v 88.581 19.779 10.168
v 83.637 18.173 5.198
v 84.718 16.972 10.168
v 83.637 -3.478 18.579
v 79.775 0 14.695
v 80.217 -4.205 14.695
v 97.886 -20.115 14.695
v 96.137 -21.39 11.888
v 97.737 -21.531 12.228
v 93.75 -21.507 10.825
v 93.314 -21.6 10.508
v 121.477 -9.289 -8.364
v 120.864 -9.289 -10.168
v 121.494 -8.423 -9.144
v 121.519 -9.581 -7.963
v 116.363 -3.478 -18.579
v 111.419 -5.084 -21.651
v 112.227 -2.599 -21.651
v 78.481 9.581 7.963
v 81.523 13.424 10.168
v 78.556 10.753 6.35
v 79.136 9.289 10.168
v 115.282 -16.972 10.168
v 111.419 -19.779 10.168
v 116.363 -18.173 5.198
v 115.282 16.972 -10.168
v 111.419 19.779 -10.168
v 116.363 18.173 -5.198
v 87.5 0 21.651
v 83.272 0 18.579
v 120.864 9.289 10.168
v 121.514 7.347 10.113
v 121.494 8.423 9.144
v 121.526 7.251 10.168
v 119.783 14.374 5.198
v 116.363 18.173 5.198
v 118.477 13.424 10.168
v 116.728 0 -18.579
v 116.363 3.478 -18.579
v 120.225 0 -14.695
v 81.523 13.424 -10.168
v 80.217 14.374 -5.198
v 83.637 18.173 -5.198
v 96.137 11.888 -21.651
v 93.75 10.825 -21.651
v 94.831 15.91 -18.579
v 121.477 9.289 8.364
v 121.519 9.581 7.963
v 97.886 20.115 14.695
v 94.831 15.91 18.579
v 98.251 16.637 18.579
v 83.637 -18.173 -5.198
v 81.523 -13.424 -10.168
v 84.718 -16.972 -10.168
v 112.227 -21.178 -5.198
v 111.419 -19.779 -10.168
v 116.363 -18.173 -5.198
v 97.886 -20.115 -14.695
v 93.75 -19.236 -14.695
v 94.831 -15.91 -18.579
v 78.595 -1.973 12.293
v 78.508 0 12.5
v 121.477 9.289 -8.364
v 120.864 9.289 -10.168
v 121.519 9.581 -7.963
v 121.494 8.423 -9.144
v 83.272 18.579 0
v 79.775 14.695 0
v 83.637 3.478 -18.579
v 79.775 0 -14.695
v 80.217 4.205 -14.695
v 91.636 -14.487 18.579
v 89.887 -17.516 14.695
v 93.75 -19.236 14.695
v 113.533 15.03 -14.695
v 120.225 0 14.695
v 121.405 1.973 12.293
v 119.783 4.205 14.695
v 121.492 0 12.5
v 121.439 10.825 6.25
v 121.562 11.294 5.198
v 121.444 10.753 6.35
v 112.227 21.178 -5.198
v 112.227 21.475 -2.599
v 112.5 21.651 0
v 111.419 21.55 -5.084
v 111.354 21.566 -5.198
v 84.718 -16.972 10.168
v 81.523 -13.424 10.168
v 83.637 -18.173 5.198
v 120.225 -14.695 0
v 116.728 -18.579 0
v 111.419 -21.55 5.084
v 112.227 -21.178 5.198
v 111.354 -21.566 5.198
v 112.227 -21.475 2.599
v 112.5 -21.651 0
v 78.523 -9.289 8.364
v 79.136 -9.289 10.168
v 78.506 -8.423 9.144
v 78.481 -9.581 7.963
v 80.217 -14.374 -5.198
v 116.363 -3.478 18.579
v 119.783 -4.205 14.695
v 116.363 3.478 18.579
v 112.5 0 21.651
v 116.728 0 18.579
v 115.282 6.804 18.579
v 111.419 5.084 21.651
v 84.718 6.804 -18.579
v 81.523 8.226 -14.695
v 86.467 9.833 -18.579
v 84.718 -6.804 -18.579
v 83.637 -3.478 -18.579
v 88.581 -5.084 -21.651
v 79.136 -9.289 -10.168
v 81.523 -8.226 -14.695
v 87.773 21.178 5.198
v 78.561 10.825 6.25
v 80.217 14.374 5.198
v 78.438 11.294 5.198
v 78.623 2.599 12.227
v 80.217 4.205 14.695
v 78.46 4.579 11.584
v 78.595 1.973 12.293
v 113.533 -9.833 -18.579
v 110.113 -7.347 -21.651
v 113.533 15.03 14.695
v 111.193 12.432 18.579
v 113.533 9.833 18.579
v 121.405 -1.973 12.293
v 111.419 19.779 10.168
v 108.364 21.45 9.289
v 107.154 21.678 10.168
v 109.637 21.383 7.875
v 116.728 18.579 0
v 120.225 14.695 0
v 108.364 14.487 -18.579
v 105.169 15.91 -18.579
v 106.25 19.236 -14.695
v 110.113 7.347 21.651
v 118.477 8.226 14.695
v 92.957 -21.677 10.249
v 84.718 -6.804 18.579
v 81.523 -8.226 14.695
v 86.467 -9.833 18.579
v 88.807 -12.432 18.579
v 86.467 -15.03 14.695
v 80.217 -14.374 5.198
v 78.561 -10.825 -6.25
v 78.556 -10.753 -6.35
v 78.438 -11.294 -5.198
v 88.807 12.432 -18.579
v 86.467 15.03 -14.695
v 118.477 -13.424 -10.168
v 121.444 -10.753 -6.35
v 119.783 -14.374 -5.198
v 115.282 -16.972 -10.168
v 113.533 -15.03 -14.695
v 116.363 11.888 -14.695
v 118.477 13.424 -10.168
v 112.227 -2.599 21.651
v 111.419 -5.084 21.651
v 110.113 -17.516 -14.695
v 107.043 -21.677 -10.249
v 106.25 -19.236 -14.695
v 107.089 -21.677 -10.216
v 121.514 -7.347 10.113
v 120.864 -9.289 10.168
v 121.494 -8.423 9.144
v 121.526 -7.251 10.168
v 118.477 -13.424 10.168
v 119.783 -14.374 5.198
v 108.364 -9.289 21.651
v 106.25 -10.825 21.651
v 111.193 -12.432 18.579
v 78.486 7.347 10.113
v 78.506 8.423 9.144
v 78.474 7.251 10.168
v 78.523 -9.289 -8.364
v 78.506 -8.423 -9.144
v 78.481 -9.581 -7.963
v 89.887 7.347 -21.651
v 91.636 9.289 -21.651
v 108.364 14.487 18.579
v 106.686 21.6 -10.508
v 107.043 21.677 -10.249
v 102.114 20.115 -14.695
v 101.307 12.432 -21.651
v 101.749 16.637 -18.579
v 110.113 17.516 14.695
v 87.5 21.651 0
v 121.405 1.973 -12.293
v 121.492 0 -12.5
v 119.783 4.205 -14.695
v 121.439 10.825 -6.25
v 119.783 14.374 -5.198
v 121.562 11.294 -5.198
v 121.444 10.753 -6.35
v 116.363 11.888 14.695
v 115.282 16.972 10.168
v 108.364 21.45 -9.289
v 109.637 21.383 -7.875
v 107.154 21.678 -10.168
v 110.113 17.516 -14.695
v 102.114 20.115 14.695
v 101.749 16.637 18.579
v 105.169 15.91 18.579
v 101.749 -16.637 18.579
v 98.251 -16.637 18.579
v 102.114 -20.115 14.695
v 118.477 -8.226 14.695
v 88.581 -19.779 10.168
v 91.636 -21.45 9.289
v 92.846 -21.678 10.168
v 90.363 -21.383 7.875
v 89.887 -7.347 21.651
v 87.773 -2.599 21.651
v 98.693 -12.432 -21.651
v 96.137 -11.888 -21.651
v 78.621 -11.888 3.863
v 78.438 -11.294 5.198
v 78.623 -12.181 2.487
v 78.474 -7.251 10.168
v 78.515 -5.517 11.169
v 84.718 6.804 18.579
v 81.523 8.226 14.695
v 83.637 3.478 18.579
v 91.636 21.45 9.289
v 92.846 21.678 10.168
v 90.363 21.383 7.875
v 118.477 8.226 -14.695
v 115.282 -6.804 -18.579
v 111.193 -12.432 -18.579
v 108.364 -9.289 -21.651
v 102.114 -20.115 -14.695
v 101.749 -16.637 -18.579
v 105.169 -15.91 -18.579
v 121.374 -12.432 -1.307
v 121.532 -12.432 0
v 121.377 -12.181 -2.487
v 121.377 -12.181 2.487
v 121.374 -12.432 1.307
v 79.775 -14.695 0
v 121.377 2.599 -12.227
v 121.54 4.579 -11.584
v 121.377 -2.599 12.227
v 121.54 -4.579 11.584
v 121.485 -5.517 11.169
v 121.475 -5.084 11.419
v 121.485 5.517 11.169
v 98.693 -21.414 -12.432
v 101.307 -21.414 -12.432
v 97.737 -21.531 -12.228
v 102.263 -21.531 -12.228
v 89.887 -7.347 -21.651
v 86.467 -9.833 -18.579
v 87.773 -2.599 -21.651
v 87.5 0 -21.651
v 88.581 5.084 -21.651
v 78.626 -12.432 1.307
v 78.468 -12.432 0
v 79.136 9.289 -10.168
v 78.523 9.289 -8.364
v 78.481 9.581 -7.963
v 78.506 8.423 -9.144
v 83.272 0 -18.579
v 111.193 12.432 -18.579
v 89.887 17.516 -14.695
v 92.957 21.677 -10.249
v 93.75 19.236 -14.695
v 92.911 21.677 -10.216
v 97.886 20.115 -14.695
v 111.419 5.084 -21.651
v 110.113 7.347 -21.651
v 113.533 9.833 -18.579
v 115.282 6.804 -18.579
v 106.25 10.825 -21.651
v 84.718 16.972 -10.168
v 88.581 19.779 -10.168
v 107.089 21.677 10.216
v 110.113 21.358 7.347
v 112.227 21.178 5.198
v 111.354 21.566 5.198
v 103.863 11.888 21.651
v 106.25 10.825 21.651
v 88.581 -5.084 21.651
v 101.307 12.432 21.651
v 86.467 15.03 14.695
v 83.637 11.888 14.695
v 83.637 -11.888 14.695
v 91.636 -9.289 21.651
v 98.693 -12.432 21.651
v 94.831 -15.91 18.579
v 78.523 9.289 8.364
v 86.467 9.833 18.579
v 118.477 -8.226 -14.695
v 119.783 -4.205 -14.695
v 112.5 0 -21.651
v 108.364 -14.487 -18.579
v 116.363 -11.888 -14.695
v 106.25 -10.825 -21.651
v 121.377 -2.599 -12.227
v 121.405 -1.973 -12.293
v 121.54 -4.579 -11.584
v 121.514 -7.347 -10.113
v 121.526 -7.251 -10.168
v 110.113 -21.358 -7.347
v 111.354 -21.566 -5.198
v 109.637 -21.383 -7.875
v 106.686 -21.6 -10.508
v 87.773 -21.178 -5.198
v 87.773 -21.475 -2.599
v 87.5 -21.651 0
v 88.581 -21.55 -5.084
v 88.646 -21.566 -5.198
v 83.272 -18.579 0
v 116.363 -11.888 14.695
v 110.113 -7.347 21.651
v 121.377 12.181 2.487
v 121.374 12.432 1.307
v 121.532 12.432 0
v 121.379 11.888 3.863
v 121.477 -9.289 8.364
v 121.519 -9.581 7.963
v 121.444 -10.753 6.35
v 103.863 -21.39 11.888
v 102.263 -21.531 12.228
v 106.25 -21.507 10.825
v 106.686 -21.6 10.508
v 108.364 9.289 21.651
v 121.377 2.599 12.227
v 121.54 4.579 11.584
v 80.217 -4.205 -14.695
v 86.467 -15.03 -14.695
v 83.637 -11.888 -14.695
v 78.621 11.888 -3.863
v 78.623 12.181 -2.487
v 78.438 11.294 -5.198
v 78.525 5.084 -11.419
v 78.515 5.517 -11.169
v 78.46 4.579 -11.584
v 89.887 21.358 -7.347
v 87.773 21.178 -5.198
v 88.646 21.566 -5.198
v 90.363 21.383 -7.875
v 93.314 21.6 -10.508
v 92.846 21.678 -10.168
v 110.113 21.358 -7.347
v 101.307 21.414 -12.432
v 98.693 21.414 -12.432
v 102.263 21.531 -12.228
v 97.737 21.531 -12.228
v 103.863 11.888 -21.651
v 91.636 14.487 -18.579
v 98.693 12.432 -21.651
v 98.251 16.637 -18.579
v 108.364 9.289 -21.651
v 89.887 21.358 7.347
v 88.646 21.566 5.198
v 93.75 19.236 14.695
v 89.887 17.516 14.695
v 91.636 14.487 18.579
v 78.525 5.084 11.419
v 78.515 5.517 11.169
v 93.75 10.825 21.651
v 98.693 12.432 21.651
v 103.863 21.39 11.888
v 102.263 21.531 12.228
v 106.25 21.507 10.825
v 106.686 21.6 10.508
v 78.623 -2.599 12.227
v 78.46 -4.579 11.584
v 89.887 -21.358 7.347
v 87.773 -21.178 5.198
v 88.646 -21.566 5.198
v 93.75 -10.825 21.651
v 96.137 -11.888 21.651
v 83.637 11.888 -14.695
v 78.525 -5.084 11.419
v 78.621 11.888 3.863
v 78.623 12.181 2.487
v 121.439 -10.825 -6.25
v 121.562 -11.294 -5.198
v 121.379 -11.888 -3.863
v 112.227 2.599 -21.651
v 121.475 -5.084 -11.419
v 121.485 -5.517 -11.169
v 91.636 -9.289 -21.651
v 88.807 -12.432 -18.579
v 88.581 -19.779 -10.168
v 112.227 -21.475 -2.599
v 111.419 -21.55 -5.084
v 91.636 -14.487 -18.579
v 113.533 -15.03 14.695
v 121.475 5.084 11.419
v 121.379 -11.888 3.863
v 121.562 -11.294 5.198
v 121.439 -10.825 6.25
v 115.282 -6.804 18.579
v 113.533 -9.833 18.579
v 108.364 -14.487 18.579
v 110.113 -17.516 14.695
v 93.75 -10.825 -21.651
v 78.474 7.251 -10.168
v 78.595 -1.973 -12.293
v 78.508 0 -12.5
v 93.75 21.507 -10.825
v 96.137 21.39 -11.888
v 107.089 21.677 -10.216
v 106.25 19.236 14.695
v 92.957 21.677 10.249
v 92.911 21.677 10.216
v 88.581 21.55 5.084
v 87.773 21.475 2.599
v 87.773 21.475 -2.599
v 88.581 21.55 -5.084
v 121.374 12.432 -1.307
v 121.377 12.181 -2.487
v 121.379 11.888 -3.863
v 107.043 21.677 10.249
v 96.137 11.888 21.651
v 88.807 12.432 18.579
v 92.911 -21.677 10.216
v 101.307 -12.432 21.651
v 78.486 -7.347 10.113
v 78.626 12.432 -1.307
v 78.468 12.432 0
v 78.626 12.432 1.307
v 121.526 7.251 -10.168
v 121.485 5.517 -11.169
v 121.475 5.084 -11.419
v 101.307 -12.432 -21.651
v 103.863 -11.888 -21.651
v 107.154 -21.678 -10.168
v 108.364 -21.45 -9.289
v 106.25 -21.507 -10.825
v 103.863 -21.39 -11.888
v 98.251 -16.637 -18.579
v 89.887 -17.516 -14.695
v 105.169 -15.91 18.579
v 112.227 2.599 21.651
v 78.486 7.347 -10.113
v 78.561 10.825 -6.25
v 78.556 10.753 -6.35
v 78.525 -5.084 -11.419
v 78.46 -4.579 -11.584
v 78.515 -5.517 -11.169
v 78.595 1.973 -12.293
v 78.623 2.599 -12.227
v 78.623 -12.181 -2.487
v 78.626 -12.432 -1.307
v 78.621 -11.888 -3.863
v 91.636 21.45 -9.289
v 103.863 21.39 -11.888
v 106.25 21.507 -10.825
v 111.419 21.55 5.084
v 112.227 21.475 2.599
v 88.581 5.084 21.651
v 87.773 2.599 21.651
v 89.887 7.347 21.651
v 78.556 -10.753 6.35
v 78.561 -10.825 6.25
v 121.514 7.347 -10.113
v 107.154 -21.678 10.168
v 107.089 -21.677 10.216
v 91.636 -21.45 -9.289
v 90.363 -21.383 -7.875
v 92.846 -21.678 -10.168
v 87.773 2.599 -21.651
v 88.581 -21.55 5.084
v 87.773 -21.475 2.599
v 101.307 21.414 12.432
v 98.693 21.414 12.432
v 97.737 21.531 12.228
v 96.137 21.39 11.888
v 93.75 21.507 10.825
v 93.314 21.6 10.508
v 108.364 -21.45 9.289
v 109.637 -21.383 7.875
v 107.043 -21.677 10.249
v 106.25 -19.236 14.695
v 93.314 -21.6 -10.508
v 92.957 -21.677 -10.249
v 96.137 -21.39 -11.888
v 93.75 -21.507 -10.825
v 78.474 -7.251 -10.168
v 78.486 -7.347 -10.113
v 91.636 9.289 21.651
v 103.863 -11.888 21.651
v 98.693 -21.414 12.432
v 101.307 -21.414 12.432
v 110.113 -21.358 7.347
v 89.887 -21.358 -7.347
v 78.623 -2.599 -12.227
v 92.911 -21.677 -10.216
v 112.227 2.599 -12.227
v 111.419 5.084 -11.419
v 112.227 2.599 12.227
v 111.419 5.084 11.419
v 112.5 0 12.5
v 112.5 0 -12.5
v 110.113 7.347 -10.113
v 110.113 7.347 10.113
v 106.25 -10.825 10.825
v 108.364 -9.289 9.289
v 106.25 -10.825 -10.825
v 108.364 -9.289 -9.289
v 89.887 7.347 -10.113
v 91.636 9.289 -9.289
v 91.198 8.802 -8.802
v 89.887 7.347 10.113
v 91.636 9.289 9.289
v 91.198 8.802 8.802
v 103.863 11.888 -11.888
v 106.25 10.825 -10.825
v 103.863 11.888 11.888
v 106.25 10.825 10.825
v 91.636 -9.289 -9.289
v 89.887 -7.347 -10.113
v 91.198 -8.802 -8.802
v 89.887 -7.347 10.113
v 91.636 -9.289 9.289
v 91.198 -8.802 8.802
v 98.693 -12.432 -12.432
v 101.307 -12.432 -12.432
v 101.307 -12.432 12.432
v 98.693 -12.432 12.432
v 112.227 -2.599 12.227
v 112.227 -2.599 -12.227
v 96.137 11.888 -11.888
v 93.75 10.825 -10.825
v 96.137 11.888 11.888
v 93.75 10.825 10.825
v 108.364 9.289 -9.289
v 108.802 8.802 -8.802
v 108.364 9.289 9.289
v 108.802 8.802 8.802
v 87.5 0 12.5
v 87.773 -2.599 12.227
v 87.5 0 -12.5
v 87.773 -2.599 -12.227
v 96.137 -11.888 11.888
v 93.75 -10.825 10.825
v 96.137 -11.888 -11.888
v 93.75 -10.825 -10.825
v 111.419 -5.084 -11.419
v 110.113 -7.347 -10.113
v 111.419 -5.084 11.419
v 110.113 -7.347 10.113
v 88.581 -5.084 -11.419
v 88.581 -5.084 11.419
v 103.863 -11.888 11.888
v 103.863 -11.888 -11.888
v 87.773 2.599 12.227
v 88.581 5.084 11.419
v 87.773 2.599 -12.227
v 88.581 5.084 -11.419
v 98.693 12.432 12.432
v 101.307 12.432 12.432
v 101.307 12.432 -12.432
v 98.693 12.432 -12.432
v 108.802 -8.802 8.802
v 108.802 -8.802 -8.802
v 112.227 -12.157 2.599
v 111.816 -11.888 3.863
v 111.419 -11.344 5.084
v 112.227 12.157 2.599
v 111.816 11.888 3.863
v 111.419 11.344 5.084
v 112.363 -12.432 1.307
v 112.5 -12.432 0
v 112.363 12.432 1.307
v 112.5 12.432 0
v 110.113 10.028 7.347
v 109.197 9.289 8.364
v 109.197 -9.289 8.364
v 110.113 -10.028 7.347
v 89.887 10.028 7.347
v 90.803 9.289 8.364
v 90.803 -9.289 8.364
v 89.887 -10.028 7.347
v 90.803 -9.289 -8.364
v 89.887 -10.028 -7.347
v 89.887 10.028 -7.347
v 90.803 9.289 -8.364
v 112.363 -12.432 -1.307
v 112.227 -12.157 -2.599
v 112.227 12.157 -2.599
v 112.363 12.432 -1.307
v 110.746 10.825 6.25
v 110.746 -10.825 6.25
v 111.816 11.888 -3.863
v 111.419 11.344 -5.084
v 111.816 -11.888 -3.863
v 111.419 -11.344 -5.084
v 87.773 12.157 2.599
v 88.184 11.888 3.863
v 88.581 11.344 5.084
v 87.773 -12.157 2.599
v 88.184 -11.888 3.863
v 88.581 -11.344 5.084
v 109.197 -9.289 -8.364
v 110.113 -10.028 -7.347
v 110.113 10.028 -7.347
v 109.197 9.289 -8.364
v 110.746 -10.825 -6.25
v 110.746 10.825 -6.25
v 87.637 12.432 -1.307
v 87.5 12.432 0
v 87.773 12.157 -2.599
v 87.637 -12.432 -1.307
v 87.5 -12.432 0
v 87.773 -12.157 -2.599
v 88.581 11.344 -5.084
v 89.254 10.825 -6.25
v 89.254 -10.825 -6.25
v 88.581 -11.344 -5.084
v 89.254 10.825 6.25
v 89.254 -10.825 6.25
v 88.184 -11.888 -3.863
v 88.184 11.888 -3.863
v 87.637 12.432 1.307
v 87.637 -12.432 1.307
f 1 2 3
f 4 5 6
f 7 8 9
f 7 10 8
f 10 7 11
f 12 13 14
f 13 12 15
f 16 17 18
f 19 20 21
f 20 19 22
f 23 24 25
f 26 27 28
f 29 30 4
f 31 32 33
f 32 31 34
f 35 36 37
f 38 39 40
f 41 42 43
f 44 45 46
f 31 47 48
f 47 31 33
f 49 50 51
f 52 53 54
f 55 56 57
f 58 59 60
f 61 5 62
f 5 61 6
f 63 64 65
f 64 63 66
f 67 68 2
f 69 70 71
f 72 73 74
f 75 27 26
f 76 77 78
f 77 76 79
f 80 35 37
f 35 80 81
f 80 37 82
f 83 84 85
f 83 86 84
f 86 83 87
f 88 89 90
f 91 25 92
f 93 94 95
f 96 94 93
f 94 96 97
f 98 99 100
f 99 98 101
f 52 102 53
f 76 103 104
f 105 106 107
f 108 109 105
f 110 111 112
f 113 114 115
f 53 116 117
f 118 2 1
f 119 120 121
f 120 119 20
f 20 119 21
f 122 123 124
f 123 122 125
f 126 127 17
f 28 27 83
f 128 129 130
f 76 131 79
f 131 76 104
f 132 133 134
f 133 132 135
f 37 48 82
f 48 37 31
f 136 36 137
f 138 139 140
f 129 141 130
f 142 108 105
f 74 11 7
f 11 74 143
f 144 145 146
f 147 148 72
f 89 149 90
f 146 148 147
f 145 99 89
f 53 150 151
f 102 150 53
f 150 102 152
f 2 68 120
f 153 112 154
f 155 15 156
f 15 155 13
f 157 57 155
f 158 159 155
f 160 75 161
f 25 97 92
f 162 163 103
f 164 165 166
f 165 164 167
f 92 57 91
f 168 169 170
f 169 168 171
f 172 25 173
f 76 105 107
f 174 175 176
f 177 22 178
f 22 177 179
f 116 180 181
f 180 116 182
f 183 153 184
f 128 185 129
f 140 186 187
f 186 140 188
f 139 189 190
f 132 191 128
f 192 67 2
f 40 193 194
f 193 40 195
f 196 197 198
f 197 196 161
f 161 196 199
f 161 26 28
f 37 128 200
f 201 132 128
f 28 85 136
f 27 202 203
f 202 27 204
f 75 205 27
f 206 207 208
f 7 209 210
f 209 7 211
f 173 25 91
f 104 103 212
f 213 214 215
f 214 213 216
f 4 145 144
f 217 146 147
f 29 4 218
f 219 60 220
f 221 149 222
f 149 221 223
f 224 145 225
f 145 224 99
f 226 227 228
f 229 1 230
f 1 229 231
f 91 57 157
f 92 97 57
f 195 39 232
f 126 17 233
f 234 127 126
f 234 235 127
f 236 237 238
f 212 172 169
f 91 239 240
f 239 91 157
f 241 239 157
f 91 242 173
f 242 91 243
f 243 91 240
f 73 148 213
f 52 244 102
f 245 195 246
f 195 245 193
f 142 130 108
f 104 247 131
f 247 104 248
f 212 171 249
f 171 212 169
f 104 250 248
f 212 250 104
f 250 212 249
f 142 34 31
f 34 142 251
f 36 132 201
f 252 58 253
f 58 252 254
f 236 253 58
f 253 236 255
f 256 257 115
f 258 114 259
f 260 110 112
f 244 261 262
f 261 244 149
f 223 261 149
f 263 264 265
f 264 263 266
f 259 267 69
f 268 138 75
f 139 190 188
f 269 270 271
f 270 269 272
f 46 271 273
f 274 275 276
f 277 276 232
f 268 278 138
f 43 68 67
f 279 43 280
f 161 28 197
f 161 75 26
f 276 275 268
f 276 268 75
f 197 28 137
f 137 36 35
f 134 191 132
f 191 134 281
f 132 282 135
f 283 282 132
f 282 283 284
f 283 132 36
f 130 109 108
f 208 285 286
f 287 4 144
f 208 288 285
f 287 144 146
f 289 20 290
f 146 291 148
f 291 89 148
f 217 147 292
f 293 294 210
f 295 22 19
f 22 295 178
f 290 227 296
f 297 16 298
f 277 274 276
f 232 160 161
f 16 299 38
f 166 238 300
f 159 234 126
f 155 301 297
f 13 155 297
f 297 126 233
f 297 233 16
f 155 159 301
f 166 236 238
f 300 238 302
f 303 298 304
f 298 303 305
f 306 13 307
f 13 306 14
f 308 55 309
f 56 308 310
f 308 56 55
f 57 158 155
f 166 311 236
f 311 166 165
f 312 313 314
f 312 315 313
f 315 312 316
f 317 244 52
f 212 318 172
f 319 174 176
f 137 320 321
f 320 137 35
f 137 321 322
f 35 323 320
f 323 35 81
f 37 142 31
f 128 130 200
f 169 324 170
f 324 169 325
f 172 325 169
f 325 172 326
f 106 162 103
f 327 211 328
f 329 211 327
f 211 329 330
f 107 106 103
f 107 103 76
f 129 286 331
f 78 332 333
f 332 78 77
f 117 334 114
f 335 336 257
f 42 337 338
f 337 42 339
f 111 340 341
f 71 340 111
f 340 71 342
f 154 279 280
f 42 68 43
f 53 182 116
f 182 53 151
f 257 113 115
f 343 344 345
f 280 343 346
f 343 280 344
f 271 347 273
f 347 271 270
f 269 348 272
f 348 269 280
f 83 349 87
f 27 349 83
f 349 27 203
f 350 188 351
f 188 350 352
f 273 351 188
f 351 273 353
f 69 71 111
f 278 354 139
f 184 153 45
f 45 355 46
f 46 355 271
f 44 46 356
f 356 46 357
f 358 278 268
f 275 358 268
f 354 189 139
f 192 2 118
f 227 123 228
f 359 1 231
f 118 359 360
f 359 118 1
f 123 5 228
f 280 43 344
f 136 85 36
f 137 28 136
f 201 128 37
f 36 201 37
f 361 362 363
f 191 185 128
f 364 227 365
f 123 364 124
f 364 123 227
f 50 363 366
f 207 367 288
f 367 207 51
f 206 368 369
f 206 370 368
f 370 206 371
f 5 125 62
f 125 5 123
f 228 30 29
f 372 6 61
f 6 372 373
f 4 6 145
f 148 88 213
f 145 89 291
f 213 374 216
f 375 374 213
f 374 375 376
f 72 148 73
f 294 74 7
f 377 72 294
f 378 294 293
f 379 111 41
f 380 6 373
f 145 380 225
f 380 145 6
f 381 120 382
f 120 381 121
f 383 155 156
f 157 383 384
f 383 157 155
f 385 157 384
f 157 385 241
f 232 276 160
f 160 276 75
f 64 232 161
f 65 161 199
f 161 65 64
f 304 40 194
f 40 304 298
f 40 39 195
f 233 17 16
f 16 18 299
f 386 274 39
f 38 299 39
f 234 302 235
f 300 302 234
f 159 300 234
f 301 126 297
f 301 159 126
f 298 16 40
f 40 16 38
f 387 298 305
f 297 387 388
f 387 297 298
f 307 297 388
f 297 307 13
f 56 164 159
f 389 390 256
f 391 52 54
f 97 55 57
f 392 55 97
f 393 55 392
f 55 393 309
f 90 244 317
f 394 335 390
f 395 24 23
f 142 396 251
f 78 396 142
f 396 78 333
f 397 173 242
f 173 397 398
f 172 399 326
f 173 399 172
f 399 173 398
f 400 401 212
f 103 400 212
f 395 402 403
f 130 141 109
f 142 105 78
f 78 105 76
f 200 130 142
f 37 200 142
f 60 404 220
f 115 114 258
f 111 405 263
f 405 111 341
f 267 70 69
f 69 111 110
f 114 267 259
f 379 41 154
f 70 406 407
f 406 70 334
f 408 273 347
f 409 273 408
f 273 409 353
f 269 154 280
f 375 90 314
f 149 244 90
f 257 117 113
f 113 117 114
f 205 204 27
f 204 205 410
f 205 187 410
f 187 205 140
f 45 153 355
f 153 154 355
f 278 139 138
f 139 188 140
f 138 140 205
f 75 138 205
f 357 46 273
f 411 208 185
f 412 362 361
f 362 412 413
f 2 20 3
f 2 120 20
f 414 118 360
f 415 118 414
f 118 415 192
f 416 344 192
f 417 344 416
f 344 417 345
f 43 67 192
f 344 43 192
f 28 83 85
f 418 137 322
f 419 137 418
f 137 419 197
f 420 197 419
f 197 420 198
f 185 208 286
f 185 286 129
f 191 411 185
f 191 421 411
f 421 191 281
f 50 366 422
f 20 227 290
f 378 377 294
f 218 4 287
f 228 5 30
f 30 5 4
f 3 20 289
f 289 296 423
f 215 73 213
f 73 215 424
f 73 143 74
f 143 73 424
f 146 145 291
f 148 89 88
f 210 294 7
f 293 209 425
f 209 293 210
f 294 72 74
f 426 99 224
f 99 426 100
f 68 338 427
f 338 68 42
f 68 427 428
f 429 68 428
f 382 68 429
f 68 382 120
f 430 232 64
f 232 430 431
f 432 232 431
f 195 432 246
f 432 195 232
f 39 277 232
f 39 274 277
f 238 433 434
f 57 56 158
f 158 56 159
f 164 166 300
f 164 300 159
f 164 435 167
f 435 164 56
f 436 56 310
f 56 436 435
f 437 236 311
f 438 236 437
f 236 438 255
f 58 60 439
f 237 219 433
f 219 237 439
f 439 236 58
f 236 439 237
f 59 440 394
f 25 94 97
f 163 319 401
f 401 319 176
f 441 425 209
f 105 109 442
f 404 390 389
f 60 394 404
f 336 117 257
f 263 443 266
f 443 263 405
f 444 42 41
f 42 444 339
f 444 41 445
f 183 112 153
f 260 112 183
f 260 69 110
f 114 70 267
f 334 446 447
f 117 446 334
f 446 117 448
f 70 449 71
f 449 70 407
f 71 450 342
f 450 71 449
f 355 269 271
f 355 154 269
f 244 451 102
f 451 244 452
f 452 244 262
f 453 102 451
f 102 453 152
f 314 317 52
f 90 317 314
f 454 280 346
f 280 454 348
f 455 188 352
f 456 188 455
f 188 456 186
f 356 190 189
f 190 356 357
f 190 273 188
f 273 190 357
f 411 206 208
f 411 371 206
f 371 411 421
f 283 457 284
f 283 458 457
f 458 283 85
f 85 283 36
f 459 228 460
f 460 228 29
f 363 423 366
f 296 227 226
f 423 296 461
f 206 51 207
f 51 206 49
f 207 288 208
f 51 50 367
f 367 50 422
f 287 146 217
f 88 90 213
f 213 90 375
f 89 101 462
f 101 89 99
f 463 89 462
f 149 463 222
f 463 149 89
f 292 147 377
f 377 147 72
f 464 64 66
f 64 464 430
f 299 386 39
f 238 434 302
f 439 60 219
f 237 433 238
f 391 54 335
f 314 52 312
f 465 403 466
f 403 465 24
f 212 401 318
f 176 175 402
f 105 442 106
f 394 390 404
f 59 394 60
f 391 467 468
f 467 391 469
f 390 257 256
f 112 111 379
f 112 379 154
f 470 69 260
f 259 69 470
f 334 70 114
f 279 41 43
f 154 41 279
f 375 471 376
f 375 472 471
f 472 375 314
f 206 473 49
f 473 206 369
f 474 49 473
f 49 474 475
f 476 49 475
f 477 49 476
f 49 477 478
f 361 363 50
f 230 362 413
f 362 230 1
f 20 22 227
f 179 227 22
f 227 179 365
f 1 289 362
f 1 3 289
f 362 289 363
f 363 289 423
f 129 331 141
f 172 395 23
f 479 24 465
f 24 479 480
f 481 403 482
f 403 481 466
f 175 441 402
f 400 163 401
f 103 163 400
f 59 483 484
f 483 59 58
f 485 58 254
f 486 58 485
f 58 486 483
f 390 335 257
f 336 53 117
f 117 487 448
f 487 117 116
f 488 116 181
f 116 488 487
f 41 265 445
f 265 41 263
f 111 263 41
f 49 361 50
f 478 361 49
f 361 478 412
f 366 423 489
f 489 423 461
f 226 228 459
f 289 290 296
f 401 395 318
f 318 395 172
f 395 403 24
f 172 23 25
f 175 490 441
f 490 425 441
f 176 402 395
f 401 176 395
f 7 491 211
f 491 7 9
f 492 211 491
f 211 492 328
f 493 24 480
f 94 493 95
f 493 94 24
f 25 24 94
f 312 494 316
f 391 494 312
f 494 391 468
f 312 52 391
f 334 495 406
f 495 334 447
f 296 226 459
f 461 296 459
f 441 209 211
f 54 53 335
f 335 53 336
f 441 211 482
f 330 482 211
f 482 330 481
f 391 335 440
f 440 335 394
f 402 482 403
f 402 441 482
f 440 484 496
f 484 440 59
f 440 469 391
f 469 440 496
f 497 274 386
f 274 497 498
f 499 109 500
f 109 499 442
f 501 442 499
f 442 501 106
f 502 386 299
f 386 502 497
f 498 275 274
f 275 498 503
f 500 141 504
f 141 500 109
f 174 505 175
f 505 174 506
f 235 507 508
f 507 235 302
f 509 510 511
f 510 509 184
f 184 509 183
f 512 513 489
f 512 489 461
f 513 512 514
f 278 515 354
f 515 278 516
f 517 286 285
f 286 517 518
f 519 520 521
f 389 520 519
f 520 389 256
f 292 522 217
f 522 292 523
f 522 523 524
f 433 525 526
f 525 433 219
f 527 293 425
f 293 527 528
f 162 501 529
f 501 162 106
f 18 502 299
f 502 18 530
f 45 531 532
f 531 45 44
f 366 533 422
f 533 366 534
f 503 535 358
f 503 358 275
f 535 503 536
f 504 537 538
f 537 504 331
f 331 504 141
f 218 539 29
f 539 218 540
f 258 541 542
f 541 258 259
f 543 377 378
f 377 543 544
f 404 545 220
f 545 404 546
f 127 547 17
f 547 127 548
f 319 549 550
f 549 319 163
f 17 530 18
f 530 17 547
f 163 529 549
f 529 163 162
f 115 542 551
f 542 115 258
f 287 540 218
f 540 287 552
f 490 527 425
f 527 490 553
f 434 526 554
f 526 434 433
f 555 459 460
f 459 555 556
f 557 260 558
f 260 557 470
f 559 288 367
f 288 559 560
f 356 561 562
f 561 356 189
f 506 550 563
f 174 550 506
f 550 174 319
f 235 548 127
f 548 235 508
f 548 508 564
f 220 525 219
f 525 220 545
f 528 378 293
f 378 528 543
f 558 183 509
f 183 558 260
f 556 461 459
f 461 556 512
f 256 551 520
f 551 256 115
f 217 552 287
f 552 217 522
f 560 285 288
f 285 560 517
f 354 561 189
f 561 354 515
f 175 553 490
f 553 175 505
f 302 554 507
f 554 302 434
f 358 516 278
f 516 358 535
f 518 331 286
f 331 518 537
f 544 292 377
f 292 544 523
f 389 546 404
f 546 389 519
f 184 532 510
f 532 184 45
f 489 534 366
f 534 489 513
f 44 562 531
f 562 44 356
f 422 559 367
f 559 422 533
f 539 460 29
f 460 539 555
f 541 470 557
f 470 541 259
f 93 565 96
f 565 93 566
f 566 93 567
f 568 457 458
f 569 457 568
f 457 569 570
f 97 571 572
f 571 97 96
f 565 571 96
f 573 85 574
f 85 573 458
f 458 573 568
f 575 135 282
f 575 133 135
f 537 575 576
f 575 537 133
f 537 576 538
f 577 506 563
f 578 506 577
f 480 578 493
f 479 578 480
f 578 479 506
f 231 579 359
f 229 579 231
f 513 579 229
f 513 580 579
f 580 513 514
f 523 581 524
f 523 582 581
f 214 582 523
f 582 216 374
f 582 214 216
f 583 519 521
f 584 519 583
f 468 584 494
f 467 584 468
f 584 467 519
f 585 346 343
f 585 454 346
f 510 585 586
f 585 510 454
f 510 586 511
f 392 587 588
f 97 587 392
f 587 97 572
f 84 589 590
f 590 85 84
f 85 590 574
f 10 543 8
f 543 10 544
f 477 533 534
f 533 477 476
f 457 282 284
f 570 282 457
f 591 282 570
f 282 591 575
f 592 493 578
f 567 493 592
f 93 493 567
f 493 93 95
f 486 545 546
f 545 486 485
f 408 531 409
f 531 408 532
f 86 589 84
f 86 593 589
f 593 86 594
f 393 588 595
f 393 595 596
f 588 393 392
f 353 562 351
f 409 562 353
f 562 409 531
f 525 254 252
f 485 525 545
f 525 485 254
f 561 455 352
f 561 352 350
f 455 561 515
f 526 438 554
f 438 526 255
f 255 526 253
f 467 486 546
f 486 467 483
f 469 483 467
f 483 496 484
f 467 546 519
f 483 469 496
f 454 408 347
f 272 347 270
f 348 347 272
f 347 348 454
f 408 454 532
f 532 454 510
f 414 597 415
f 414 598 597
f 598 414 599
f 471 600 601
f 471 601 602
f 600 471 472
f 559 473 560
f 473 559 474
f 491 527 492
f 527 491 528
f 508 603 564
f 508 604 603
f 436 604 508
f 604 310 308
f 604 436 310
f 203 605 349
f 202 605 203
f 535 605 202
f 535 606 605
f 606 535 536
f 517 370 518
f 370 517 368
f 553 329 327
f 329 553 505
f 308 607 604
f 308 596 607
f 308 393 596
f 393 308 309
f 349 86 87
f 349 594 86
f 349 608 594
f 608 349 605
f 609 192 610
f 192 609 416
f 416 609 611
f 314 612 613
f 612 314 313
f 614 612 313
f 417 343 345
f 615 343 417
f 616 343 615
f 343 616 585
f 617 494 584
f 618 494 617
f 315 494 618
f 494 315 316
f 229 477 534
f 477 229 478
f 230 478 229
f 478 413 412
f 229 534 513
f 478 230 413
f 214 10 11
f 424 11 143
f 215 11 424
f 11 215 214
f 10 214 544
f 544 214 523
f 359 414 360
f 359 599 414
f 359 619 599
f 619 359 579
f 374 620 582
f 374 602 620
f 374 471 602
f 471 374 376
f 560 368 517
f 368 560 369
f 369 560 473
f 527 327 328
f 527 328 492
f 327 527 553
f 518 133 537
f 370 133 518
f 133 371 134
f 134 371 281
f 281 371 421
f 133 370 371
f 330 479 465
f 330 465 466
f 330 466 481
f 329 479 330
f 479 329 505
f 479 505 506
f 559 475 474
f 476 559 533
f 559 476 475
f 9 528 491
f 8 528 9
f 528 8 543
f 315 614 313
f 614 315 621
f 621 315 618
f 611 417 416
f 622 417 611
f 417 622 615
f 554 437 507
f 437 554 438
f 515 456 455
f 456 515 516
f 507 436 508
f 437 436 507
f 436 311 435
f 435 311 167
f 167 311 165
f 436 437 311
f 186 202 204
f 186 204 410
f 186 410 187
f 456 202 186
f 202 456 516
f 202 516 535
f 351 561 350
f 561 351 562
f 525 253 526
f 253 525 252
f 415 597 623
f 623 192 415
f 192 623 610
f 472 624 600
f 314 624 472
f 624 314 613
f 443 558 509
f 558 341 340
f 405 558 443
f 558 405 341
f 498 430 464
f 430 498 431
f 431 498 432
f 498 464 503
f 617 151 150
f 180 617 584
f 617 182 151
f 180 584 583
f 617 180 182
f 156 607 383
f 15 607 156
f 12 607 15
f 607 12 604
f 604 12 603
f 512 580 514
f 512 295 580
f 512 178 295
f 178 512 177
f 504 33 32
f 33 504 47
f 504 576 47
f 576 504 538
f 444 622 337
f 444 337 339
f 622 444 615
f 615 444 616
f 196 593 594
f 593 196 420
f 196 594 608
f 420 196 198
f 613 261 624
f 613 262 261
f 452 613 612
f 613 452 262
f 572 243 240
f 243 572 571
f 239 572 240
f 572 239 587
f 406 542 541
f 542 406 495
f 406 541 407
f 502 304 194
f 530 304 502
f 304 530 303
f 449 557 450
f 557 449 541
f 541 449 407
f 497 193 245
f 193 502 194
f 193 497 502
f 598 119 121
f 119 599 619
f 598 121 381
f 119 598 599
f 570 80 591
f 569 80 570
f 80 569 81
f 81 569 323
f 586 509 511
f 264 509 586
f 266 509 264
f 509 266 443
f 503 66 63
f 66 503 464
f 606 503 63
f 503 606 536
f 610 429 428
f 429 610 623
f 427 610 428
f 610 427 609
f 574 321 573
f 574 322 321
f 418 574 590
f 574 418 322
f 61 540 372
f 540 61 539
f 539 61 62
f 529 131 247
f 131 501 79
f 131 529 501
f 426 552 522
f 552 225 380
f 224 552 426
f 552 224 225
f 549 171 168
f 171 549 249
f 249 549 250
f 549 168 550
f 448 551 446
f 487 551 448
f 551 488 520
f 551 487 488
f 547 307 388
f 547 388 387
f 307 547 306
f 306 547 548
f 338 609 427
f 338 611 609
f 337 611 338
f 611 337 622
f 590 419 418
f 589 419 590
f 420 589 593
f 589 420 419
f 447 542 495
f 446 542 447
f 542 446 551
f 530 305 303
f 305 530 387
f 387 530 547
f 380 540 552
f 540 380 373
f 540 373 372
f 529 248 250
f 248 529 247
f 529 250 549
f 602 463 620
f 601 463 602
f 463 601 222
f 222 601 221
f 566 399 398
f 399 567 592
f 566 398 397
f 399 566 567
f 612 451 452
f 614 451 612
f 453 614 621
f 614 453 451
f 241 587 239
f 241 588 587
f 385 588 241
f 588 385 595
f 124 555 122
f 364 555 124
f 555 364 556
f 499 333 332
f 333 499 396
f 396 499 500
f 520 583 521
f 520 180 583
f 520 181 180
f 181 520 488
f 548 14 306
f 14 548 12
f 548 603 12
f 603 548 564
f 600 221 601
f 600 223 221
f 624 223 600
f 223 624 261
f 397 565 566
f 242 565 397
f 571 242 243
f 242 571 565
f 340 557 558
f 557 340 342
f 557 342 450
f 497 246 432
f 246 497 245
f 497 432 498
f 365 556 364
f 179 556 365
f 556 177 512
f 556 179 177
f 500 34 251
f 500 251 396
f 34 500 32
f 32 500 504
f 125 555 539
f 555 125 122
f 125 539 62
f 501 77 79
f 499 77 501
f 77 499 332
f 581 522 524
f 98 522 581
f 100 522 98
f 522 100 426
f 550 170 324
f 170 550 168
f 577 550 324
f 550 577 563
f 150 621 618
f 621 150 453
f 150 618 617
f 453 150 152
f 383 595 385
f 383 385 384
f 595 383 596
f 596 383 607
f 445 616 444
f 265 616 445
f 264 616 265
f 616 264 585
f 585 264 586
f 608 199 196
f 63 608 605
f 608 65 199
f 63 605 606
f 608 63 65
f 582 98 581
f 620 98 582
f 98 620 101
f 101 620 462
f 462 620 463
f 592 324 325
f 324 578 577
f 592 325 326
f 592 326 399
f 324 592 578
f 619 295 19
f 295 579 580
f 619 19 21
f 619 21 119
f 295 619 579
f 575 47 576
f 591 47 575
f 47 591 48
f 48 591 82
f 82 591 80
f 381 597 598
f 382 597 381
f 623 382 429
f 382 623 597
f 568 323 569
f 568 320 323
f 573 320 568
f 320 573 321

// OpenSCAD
// copy of example001 used for camera tests

module example001()
{
	function r_from_dia(d) = d / 2;

	module rotcy(rot, r, h) {
		rotate(90, rot)
			cylinder(r = r, h = h, center = true);
	}

	difference() {
		sphere(r = r_from_dia(size));
		rotcy([0, 0, 0], cy_r, cy_h);
		rotcy([1, 0, 0], cy_r, cy_h);
		rotcy([0, 1, 0], cy_r, cy_h);
	}

	size = 50;
	hole = 25;

	cy_r = r_from_dia(hole);
	cy_h = r_from_dia(size * 2.5);
}

translate([100,0,0]) example001();
